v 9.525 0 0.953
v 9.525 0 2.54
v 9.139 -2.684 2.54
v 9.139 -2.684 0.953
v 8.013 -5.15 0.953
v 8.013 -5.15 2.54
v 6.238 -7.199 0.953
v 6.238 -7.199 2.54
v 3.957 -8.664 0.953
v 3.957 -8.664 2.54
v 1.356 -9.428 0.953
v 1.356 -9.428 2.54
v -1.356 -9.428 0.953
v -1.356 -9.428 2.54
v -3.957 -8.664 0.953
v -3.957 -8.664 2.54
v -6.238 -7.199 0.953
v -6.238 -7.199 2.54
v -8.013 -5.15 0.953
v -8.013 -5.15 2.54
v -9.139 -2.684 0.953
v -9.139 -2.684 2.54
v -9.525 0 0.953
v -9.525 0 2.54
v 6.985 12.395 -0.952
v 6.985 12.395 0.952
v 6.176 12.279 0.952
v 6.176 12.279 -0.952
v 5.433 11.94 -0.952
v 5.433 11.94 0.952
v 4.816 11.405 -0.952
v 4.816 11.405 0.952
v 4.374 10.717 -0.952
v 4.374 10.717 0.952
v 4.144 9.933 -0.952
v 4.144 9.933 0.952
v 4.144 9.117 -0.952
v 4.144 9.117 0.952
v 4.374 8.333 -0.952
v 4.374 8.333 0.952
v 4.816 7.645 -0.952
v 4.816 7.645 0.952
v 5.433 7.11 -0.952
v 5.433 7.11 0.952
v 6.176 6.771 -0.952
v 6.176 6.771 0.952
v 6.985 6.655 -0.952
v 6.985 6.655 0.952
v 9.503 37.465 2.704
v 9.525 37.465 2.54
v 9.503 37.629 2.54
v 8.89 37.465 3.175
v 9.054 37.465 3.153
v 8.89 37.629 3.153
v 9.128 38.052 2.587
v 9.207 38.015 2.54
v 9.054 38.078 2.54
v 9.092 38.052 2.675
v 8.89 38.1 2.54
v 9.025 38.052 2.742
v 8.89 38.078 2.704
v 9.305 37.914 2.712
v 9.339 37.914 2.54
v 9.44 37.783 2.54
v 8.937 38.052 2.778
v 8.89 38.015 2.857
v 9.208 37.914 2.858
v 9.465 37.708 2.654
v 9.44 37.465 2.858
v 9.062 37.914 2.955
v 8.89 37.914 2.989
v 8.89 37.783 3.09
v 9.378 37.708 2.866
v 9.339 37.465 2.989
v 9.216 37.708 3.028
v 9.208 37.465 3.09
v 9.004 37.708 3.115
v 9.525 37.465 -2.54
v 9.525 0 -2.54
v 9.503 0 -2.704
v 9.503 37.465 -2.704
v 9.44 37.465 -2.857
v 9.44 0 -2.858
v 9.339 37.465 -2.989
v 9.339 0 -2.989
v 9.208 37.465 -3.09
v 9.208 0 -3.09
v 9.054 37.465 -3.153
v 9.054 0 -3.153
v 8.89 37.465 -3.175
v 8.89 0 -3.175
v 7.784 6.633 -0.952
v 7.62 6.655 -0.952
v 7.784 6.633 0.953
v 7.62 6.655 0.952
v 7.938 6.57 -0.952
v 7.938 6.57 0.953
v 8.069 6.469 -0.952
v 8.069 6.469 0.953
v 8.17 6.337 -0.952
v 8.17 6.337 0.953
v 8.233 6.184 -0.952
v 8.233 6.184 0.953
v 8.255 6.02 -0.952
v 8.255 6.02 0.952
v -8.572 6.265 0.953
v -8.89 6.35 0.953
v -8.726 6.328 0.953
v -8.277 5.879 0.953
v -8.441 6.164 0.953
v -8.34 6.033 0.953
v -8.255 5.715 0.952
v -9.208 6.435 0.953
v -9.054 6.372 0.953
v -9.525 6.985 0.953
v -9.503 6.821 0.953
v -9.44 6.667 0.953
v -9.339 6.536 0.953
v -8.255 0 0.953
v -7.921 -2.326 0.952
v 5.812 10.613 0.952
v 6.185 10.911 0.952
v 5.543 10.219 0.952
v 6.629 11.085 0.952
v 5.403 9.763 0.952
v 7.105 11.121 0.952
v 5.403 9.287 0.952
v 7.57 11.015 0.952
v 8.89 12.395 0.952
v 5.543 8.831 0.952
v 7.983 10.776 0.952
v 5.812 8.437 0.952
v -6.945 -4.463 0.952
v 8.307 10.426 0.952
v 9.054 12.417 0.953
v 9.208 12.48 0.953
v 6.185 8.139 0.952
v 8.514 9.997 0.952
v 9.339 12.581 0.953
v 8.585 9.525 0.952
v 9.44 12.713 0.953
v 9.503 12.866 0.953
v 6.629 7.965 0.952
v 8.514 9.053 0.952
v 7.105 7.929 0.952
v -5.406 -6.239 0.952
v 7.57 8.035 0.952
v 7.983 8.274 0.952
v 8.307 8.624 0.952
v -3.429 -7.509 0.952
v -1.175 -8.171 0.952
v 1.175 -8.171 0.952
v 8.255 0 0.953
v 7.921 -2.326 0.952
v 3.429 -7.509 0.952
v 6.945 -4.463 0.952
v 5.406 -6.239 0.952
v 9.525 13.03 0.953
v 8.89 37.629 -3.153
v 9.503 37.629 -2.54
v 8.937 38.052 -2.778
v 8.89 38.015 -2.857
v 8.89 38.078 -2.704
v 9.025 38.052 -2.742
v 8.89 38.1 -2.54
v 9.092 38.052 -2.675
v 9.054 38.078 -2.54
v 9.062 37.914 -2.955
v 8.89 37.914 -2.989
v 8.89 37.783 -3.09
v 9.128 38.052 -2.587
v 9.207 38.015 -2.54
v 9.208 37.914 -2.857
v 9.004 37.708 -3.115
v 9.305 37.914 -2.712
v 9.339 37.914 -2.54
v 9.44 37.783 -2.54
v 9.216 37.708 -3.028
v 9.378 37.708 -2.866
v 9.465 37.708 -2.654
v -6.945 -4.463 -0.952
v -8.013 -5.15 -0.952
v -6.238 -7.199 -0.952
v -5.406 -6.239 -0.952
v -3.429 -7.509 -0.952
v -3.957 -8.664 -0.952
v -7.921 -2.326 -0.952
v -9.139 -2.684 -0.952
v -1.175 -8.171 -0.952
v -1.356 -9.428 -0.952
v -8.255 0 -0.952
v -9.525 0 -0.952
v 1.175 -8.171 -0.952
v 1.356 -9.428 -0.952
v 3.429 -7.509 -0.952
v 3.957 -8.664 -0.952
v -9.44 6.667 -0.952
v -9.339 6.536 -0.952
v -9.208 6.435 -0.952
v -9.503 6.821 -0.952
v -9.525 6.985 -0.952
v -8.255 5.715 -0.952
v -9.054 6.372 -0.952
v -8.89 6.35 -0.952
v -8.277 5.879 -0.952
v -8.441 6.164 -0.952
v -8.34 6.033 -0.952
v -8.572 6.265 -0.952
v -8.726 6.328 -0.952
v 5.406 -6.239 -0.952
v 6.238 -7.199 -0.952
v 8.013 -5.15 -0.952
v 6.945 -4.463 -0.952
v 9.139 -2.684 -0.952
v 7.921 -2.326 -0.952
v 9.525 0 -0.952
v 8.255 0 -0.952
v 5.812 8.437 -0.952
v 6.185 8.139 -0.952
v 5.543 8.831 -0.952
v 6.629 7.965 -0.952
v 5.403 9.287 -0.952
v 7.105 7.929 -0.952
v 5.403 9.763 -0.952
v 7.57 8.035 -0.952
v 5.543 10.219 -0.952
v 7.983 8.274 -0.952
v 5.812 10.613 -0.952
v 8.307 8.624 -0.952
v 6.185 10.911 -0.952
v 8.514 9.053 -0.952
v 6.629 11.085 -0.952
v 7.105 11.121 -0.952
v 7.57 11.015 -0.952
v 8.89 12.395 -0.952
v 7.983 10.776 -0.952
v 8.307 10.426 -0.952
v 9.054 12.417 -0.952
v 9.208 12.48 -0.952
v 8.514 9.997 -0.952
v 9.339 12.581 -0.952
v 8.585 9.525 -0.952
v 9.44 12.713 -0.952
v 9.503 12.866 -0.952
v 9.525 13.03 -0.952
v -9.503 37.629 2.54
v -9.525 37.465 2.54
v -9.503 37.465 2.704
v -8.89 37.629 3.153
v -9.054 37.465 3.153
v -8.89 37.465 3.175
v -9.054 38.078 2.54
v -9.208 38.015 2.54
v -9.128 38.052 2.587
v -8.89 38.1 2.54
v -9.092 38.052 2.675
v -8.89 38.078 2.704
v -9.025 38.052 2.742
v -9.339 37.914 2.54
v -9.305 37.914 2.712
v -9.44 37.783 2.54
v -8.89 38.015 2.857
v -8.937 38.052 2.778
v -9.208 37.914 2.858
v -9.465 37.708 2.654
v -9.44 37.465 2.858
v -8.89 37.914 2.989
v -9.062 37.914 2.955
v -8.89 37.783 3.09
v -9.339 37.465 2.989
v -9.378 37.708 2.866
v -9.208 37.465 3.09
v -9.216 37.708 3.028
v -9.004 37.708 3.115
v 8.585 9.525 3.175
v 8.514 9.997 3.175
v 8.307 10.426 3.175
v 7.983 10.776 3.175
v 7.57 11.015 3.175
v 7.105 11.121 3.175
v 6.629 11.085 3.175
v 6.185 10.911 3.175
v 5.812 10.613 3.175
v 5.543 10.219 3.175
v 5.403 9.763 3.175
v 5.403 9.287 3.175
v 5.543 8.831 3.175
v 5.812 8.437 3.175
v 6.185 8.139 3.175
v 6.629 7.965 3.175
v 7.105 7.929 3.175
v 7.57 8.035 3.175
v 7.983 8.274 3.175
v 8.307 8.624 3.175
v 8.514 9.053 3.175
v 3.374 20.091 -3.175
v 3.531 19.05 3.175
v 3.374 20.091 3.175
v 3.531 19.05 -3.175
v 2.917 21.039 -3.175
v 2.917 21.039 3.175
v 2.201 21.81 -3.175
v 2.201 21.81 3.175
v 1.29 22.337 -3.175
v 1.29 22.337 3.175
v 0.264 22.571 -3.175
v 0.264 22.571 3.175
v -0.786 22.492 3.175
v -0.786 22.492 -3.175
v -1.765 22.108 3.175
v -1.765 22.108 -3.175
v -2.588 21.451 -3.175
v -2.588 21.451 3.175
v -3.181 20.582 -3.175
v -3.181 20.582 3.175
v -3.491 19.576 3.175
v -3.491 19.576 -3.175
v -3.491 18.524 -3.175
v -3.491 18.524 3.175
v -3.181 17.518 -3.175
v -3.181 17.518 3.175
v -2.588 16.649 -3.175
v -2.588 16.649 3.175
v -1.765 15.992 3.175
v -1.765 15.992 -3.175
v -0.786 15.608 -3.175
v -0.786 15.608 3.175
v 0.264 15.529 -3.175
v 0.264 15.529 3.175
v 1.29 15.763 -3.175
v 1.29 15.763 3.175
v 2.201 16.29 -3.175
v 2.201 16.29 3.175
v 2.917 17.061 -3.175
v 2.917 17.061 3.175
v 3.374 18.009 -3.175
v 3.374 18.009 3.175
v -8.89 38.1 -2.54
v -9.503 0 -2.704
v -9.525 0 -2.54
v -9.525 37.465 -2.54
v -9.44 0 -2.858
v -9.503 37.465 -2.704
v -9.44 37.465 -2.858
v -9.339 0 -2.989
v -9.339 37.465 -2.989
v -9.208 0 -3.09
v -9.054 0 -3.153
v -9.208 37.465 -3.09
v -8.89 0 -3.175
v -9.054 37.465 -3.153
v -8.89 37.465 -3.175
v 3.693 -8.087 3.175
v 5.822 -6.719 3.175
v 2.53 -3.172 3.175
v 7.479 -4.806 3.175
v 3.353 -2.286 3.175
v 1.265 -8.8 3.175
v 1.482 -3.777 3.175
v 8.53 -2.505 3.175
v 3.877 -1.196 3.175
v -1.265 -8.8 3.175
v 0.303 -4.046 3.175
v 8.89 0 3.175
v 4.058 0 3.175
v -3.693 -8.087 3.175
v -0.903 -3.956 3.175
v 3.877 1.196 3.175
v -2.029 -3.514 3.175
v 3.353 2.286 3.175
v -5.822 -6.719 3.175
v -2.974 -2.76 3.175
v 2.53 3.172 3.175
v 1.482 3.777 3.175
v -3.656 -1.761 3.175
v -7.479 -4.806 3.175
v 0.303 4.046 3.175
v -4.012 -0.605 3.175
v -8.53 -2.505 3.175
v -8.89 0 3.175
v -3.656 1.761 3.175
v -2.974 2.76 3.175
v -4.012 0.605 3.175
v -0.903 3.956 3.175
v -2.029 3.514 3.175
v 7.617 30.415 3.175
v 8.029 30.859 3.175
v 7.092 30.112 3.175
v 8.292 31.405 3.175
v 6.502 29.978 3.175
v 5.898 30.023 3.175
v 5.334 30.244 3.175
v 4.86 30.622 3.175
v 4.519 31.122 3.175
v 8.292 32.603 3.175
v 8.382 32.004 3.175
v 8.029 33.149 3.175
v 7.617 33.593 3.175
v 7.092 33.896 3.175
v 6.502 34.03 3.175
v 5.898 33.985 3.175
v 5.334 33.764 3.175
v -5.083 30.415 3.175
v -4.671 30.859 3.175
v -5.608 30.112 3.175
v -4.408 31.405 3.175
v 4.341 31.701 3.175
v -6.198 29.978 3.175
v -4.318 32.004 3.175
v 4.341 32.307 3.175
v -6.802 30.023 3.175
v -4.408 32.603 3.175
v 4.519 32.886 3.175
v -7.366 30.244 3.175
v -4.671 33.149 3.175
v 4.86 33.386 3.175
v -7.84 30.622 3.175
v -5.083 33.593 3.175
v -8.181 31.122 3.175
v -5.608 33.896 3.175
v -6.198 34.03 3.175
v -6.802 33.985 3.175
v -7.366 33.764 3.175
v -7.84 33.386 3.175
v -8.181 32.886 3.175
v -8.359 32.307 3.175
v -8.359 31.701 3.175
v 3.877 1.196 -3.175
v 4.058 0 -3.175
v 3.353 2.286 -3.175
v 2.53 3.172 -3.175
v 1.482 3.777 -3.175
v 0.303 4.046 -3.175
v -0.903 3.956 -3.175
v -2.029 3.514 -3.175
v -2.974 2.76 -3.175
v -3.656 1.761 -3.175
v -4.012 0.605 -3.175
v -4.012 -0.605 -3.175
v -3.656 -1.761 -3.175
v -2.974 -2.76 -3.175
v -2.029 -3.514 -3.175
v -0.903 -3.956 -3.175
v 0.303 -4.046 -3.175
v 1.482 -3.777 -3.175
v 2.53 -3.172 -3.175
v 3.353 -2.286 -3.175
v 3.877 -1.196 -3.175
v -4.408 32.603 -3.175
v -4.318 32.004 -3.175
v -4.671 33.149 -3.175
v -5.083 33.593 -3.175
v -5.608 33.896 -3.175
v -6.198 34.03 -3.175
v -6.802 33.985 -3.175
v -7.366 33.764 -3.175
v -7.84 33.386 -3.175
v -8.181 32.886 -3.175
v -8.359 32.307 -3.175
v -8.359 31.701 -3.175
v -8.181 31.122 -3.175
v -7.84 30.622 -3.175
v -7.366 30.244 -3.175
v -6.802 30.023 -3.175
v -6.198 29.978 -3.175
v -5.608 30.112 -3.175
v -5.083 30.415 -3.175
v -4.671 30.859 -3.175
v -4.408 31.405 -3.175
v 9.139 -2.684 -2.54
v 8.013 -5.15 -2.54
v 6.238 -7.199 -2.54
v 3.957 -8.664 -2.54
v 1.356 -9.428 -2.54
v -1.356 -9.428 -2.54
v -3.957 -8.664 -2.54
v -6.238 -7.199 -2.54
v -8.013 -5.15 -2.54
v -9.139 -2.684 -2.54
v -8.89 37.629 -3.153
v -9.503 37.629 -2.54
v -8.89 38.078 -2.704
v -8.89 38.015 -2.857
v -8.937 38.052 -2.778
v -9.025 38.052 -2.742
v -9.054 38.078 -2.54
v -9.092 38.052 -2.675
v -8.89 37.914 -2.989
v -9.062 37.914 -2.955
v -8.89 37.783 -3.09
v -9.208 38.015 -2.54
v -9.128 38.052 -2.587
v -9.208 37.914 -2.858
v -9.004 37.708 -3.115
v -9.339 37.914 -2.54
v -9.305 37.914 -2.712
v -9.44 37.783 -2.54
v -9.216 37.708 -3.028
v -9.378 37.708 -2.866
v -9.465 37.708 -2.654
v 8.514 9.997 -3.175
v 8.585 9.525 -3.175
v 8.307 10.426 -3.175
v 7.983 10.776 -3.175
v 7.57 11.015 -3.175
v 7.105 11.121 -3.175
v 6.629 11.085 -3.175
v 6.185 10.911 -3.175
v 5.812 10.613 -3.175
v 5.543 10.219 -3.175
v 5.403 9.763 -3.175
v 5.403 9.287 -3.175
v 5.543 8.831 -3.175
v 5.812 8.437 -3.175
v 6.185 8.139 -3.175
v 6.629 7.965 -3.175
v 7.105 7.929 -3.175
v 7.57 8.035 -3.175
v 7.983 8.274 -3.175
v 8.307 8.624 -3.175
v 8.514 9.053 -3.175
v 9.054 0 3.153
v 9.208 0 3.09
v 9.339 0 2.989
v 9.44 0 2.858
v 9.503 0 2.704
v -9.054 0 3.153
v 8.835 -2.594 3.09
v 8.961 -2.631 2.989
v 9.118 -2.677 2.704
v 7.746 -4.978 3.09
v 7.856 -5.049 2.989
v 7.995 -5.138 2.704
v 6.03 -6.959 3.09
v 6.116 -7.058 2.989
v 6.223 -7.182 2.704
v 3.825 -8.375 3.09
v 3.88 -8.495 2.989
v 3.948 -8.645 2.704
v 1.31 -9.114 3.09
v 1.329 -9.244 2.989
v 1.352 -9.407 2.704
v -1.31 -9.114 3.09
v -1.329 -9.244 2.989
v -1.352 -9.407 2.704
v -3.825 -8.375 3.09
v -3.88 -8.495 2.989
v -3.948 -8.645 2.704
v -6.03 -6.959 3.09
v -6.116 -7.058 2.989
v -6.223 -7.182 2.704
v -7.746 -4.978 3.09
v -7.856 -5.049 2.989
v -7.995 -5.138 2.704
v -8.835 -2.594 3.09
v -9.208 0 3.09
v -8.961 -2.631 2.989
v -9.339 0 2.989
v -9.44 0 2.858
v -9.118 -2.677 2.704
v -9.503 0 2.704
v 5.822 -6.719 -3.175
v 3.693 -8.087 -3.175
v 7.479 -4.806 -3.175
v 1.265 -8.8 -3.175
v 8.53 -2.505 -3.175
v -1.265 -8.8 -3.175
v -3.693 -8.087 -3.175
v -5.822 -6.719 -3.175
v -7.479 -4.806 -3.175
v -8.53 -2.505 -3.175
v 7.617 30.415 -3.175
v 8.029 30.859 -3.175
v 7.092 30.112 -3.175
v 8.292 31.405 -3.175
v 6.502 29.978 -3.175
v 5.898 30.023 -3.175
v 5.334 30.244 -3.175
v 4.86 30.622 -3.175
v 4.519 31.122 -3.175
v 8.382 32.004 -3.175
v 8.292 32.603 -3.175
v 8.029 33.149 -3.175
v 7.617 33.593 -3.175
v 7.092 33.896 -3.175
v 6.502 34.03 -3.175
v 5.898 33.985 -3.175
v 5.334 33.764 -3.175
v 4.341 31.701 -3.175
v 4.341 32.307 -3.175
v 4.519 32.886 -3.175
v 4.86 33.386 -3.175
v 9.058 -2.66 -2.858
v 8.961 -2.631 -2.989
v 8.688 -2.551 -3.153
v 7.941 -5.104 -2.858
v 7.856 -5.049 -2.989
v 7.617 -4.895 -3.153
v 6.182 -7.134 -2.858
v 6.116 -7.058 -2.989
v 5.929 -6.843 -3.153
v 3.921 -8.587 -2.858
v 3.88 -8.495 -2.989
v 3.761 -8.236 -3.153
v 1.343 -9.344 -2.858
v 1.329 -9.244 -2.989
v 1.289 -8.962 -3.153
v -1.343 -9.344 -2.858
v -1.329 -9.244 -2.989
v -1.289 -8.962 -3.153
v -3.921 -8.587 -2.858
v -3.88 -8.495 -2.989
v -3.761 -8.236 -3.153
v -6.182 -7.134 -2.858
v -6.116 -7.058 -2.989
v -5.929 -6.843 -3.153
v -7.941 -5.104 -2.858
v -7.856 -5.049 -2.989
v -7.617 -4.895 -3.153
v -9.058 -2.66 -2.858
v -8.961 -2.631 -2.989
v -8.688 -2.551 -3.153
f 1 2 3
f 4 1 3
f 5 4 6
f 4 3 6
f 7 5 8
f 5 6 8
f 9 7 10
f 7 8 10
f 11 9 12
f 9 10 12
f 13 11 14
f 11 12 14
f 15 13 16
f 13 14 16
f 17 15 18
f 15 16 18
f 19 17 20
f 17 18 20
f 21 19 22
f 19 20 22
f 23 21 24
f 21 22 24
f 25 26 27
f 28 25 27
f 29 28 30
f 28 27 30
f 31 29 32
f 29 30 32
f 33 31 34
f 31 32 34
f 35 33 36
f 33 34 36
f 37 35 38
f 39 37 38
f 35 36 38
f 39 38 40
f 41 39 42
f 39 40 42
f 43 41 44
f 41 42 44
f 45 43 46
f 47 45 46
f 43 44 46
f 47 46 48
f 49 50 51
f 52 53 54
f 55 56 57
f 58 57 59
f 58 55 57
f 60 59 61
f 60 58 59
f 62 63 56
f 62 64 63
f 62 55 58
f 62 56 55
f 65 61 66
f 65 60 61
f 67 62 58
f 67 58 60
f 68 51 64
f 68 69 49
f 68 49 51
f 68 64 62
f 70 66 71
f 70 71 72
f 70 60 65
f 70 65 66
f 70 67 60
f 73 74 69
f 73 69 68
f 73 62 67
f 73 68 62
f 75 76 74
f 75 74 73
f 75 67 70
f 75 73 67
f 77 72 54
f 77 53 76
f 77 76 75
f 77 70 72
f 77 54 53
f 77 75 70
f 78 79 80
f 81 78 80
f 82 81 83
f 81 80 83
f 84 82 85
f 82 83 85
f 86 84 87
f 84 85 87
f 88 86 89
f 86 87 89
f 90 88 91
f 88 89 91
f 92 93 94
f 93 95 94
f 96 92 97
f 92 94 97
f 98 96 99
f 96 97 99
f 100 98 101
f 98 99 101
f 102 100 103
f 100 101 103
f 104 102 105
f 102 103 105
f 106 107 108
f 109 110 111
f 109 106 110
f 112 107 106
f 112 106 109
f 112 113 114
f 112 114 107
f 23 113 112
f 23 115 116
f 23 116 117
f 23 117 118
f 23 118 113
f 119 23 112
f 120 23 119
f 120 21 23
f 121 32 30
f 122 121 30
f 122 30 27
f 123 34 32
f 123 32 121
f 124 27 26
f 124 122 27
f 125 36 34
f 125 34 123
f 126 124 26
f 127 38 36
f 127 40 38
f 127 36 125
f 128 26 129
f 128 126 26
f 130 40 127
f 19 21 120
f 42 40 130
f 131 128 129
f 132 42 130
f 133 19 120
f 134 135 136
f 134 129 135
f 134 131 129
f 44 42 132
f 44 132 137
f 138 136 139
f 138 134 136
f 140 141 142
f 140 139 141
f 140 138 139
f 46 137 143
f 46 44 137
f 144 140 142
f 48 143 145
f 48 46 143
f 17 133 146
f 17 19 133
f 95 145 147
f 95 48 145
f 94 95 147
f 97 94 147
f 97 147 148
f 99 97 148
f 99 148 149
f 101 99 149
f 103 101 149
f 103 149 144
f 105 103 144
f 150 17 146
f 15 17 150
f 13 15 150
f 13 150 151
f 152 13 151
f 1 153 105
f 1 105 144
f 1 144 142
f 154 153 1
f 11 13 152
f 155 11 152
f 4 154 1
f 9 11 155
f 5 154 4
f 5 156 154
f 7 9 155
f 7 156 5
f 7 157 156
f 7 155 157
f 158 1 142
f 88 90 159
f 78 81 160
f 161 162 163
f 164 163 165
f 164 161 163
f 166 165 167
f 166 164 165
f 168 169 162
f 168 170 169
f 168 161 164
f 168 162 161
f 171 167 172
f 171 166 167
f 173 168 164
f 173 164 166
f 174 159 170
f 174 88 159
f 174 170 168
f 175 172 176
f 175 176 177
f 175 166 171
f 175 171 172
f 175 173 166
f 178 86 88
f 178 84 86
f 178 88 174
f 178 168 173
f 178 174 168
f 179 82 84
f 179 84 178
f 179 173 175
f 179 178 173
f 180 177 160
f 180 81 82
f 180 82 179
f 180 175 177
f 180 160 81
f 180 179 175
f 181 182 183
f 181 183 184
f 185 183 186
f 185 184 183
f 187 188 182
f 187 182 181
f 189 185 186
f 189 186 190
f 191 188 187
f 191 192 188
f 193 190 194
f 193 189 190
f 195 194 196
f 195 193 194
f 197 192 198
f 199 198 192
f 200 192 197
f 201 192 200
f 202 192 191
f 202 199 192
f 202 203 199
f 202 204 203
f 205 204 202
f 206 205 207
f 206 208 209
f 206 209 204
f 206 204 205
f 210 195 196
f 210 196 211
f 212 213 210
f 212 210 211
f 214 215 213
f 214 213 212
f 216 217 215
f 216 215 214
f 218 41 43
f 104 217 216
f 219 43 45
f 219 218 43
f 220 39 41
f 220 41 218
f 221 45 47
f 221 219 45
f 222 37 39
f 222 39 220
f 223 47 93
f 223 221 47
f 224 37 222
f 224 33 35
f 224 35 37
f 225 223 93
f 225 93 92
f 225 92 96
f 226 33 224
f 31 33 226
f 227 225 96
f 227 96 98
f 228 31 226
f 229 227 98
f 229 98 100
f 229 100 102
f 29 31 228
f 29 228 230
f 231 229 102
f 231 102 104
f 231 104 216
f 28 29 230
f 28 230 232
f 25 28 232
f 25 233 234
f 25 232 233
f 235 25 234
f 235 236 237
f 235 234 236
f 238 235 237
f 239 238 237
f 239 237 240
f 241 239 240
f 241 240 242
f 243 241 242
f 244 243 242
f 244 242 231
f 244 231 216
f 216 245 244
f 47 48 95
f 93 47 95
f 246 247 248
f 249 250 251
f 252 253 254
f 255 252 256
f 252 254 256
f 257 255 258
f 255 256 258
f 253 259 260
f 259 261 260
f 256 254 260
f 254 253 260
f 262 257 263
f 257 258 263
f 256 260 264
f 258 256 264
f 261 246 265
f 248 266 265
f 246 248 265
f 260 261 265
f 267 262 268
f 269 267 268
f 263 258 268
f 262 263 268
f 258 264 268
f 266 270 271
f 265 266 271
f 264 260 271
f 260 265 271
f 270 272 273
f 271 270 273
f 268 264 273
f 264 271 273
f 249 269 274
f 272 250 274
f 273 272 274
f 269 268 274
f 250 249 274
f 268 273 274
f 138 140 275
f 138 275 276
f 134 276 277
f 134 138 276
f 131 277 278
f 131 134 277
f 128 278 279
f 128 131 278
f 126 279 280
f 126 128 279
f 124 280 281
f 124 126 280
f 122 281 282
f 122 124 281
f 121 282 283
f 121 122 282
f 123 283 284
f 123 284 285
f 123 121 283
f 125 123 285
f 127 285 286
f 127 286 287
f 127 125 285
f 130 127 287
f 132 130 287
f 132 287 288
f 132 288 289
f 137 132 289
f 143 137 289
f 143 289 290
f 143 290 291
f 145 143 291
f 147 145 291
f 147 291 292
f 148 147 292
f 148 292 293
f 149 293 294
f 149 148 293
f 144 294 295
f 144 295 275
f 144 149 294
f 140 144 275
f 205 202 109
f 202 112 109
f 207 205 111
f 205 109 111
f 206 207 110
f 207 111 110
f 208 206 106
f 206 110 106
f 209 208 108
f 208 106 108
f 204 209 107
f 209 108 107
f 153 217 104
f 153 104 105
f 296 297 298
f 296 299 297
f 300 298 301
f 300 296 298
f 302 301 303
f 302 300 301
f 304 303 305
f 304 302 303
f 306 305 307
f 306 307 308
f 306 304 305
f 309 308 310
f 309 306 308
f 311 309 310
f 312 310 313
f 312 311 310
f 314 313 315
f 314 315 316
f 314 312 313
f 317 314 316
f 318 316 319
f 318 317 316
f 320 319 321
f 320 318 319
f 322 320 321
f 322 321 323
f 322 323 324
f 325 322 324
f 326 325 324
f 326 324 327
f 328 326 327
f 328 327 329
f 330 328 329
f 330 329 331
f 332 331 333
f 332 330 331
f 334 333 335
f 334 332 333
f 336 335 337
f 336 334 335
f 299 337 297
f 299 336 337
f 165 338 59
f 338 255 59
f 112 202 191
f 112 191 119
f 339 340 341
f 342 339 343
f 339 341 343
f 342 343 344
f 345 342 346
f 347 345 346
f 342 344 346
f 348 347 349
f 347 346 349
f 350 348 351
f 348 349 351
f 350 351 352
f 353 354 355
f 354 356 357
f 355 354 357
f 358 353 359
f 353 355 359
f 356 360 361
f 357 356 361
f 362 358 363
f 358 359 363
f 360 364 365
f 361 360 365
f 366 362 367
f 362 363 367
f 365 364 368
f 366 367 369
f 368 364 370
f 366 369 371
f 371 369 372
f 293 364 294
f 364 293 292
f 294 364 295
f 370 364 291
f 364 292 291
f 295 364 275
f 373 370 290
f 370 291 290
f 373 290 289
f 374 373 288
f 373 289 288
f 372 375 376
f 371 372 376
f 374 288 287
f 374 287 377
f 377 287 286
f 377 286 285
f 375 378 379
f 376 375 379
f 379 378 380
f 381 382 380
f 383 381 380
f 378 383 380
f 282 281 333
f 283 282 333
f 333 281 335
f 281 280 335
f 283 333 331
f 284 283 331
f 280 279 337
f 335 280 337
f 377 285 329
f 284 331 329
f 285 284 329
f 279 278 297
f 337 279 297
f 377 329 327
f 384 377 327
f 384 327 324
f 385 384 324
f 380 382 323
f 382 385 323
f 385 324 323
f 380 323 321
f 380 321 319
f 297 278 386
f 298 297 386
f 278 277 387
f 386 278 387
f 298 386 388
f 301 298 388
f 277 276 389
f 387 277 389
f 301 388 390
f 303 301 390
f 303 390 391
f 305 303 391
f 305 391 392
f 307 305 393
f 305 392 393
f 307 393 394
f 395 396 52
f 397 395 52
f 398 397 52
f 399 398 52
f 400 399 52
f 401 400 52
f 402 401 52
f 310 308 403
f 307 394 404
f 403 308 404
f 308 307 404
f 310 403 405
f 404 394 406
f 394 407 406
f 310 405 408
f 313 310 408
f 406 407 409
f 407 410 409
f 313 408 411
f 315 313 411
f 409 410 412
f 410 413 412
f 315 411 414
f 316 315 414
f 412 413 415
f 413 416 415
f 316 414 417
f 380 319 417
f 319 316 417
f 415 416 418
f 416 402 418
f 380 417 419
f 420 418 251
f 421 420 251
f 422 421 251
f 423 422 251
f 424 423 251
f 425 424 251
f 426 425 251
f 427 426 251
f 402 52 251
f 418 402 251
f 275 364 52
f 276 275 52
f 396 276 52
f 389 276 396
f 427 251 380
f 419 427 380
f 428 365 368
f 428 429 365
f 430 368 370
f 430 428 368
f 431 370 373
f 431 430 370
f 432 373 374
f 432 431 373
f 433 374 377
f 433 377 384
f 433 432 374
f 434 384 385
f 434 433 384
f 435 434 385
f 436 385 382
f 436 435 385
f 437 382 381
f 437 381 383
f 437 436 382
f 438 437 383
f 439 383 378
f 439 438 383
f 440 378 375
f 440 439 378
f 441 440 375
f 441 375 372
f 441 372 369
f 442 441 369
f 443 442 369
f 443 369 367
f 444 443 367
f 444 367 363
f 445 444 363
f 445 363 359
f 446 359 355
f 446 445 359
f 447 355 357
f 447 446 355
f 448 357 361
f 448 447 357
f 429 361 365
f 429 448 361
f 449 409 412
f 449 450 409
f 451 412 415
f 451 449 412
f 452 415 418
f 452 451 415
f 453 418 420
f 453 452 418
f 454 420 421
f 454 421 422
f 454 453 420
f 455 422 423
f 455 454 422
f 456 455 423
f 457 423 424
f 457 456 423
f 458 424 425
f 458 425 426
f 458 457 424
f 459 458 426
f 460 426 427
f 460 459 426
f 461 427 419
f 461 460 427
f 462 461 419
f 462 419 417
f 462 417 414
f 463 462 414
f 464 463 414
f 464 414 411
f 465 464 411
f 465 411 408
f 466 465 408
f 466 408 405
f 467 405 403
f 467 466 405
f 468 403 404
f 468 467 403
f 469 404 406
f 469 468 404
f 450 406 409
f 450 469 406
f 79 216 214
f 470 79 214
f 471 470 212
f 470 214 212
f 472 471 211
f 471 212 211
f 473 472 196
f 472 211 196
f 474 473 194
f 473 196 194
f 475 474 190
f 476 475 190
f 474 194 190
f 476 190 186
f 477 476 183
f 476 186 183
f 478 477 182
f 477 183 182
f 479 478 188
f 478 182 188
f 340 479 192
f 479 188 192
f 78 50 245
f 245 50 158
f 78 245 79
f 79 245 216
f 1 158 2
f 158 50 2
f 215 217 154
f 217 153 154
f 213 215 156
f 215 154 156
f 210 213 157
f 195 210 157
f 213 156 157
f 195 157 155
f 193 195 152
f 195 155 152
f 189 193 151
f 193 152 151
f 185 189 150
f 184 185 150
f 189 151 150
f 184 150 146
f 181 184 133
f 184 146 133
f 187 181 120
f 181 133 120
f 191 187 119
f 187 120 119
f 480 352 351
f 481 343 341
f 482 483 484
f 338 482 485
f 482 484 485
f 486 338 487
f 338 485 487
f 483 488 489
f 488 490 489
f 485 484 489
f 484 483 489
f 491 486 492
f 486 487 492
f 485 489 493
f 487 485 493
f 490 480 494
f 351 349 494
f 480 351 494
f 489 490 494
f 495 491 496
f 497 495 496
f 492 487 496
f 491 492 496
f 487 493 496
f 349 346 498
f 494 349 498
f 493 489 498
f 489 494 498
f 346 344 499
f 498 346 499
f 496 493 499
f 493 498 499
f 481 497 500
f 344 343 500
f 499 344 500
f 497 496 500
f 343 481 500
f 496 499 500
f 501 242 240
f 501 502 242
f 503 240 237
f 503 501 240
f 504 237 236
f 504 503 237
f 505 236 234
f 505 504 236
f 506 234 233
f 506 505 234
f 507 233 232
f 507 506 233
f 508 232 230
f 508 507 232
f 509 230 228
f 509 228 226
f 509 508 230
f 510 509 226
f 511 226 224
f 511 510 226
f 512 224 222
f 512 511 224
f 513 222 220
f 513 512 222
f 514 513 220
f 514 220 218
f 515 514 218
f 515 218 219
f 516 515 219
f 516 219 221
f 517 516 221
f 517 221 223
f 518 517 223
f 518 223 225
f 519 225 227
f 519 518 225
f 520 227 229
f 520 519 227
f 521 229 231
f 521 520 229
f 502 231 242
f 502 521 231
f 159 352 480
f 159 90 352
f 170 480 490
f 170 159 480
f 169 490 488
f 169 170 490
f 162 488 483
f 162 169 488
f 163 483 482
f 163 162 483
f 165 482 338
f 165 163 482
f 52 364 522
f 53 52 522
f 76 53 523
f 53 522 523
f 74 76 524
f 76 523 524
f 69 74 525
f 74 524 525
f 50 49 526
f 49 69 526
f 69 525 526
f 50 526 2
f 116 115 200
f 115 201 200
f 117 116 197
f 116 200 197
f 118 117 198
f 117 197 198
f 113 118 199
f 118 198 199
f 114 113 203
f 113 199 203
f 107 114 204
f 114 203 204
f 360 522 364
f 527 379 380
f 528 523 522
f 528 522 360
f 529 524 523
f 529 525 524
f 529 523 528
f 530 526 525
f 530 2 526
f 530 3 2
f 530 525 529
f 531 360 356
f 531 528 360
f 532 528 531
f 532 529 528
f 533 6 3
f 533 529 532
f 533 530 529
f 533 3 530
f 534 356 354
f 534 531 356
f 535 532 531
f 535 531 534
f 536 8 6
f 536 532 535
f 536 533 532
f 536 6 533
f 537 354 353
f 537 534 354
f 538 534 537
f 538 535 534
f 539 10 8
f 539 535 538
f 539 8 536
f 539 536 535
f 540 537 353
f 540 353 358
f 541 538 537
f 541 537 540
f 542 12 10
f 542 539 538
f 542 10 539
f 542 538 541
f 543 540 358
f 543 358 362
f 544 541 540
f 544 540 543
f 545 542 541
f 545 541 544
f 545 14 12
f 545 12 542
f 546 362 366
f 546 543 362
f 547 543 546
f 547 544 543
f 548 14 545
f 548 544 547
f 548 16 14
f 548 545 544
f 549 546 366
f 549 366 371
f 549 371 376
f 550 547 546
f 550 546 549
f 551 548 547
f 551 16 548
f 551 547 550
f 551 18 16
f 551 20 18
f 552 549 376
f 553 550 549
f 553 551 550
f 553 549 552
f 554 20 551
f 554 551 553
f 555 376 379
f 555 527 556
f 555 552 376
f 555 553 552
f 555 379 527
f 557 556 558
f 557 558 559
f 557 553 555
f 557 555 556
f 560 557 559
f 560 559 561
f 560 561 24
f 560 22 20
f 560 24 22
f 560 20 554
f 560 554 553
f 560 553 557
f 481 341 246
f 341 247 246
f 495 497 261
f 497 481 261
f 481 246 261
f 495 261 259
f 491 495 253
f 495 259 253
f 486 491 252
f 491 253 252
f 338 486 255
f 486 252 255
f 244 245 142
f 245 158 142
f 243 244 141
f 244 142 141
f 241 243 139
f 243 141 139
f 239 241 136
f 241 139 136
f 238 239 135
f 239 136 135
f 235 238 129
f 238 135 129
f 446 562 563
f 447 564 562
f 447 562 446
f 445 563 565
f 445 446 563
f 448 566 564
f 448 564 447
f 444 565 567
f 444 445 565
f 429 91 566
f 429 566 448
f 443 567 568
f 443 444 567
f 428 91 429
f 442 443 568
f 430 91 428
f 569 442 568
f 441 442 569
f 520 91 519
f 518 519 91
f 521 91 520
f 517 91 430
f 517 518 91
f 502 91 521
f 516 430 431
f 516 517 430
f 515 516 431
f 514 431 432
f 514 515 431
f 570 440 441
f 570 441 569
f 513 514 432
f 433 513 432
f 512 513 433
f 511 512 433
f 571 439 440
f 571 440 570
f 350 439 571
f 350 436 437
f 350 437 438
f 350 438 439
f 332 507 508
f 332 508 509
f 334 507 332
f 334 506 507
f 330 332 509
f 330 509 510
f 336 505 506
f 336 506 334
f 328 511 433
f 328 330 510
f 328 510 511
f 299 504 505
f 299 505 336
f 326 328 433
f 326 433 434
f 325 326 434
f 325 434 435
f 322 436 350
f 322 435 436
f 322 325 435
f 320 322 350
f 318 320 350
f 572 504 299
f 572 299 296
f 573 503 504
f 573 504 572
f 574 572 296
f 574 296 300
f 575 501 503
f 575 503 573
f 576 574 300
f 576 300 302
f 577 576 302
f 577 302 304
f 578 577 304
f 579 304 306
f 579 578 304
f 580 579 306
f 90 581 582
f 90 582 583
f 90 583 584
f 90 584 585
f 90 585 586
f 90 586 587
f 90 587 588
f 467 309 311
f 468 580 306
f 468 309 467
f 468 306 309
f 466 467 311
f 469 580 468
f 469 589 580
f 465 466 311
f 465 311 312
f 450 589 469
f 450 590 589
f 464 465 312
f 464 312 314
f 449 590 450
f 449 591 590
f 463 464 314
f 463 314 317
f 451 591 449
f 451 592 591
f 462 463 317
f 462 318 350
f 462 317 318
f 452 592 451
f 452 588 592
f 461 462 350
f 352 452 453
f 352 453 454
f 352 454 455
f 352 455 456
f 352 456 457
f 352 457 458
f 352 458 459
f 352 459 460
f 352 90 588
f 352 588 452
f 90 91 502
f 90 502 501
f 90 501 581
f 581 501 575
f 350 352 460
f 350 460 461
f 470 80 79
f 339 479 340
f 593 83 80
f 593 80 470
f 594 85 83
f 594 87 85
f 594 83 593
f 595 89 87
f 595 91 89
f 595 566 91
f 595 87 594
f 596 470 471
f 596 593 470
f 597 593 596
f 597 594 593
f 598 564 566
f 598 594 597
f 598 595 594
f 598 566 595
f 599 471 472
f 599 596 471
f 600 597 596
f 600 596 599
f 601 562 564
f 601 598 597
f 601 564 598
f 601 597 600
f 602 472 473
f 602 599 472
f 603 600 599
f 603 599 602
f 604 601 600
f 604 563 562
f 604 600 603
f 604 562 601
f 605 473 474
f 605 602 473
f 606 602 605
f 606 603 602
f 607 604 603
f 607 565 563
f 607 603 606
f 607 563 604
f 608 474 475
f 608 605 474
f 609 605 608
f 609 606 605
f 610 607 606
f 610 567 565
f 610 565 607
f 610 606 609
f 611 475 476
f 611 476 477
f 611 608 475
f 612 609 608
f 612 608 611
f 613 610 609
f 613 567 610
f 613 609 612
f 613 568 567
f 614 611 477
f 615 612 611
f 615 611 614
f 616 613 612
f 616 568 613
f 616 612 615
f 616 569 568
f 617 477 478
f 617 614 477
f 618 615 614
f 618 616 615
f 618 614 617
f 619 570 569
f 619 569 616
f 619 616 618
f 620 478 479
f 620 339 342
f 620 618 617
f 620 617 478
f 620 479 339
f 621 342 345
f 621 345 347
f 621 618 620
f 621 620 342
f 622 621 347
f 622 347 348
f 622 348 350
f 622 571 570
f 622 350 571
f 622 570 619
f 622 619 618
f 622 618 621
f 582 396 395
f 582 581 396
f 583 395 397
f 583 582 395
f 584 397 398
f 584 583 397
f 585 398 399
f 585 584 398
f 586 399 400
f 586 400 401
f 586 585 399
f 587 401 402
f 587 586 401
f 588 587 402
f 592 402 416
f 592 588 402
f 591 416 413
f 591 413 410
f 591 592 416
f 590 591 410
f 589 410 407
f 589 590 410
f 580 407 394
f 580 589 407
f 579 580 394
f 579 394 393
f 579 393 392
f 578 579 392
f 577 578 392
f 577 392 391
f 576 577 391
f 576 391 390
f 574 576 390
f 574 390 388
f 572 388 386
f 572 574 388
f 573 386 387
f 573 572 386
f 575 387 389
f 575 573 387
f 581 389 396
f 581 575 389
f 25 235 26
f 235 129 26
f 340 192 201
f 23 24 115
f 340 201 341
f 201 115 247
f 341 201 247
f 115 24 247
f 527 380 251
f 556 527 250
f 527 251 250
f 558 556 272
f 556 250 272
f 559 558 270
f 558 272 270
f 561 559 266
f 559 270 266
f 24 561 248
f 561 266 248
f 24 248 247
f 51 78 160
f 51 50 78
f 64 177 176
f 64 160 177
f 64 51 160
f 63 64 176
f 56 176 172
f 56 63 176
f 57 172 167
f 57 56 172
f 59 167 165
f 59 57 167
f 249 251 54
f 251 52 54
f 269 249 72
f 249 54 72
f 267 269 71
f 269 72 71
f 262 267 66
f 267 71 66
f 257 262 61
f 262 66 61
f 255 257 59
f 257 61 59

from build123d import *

# Parameters (mm, degrees)
SKETCH1_R           = 4.05765
SKETCH1_R_2         = 3.5306
SKETCH1_R_3         = 2.032
SKETCH1_R_4         = 1.6002
BOSS_EXTRUDE1_DEPTH = 3.175
SKETCH1_7_R         = 1.6002
CUT_EXTRUDE4_DEPTH  = 0.9525
SKETCH3_W           = 1.27
SKETCH3_H           = 1.905
FILLET1_R           = 0.635
FILLET2_R           = 0.635


with BuildPart() as part:
    # Sketch1 → Boss-Extrude1 (new, symmetric)
    with BuildSketch(Plane.XY):
        with BuildLine():
            Line((9.525, 38.1), (9.525, 0))
            ThreePointArc((9.525, 0), (0, -9.525), (-9.525, 0))
            Line((-9.525, 0), (-9.525, 38.1))
            Line((-9.525, 38.1), (9.525, 38.1))
        make_face()
        Circle(SKETCH1_R, mode=Mode.SUBTRACT)
        with Locations((0, 19.05)):
            Circle(SKETCH1_R_2, mode=Mode.SUBTRACT)
        with Locations((-6.35, 32.004)):
            Circle(SKETCH1_R_3, mode=Mode.SUBTRACT)
        with Locations((6.35, 32.004)):
            Circle(SKETCH1_R_3, mode=Mode.SUBTRACT)
        with Locations((6.985, 9.525)):
            Circle(SKETCH1_R_4, mode=Mode.SUBTRACT)
    extrude(amount=BOSS_EXTRUDE1_DEPTH, both=True)

    # Sketch1<7> → Cut-Extrude4 (cut, symmetric)
    with BuildSketch(Plane.XY):
        with BuildLine():
            Line((9.525, 6.6548), (9.525, 12.3952))
            Line((9.525, 12.3952), (6.985, 12.3952))
            ThreePointArc((6.985, 12.3952), (4.1148, 9.525), (6.985, 6.6548))
            Line((6.985, 6.6548), (9.525, 6.6548))
        make_face()
        with Locations((6.985, 9.525)):
            Circle(SKETCH1_7_R, mode=Mode.SUBTRACT)
    extrude(amount=CUT_EXTRUDE4_DEPTH, both=True, mode=Mode.SUBTRACT)

    # Cut-Sweep1: sweep along a path in Sketch2
    with BuildLine(Plane.XY.offset(3.175)) as cut_sweep1_path:
        Line((9.525, 6.6548), (9.525, 0))
        ThreePointArc((9.525, 0), (0, -9.525), (-9.525, 0))
        Line((-9.525, 0), (-9.525, 6.35))
    # Sketch3 → Cut-Sweep1 (sweep, cut)
    with BuildSketch(Plane(origin=(0, 6.6548, 0), x_dir=(1, 0, 0), z_dir=(0, 1, 0))):
        with Locations((8.89, 0)):
            Rectangle(SKETCH3_W, SKETCH3_H)
    sweep(path=cut_sweep1_path.line, mode=Mode.SUBTRACT)

    # Fillet1
    fillet1_edges = [part.edges().sort_by_distance(p)[0] for p in [
        (0, -9.525, 3.175),
        (-9.525, 19.05, -3.175),
        (0, 38.1, -3.175),
        (9.525, 19.05, 3.175),
        (9.525, 19.05, -3.175),
        (0, -9.525, -3.175),
        (-9.525, 38.1, 0),
        (9.525, 38.1, 0),
        (0, 38.1, 3.175),
        (-9.525, 19.05, 3.175),
    ]]
    fillet(fillet1_edges, radius=FILLET1_R)

    # Fillet2
    fillet2_edges = [part.edges().sort_by_distance(p)[0] for p in [
        (8.255, 6.6548, 0),
        (9.525, 12.3952, 0),
        (-9.525, 6.35, 0),
        (-8.255, 6.35, 0),
    ]]
    fillet(fillet2_edges, radius=FILLET2_R - 0.0001)  # a hair under: the kernel refuses the full size


solid = part.part
